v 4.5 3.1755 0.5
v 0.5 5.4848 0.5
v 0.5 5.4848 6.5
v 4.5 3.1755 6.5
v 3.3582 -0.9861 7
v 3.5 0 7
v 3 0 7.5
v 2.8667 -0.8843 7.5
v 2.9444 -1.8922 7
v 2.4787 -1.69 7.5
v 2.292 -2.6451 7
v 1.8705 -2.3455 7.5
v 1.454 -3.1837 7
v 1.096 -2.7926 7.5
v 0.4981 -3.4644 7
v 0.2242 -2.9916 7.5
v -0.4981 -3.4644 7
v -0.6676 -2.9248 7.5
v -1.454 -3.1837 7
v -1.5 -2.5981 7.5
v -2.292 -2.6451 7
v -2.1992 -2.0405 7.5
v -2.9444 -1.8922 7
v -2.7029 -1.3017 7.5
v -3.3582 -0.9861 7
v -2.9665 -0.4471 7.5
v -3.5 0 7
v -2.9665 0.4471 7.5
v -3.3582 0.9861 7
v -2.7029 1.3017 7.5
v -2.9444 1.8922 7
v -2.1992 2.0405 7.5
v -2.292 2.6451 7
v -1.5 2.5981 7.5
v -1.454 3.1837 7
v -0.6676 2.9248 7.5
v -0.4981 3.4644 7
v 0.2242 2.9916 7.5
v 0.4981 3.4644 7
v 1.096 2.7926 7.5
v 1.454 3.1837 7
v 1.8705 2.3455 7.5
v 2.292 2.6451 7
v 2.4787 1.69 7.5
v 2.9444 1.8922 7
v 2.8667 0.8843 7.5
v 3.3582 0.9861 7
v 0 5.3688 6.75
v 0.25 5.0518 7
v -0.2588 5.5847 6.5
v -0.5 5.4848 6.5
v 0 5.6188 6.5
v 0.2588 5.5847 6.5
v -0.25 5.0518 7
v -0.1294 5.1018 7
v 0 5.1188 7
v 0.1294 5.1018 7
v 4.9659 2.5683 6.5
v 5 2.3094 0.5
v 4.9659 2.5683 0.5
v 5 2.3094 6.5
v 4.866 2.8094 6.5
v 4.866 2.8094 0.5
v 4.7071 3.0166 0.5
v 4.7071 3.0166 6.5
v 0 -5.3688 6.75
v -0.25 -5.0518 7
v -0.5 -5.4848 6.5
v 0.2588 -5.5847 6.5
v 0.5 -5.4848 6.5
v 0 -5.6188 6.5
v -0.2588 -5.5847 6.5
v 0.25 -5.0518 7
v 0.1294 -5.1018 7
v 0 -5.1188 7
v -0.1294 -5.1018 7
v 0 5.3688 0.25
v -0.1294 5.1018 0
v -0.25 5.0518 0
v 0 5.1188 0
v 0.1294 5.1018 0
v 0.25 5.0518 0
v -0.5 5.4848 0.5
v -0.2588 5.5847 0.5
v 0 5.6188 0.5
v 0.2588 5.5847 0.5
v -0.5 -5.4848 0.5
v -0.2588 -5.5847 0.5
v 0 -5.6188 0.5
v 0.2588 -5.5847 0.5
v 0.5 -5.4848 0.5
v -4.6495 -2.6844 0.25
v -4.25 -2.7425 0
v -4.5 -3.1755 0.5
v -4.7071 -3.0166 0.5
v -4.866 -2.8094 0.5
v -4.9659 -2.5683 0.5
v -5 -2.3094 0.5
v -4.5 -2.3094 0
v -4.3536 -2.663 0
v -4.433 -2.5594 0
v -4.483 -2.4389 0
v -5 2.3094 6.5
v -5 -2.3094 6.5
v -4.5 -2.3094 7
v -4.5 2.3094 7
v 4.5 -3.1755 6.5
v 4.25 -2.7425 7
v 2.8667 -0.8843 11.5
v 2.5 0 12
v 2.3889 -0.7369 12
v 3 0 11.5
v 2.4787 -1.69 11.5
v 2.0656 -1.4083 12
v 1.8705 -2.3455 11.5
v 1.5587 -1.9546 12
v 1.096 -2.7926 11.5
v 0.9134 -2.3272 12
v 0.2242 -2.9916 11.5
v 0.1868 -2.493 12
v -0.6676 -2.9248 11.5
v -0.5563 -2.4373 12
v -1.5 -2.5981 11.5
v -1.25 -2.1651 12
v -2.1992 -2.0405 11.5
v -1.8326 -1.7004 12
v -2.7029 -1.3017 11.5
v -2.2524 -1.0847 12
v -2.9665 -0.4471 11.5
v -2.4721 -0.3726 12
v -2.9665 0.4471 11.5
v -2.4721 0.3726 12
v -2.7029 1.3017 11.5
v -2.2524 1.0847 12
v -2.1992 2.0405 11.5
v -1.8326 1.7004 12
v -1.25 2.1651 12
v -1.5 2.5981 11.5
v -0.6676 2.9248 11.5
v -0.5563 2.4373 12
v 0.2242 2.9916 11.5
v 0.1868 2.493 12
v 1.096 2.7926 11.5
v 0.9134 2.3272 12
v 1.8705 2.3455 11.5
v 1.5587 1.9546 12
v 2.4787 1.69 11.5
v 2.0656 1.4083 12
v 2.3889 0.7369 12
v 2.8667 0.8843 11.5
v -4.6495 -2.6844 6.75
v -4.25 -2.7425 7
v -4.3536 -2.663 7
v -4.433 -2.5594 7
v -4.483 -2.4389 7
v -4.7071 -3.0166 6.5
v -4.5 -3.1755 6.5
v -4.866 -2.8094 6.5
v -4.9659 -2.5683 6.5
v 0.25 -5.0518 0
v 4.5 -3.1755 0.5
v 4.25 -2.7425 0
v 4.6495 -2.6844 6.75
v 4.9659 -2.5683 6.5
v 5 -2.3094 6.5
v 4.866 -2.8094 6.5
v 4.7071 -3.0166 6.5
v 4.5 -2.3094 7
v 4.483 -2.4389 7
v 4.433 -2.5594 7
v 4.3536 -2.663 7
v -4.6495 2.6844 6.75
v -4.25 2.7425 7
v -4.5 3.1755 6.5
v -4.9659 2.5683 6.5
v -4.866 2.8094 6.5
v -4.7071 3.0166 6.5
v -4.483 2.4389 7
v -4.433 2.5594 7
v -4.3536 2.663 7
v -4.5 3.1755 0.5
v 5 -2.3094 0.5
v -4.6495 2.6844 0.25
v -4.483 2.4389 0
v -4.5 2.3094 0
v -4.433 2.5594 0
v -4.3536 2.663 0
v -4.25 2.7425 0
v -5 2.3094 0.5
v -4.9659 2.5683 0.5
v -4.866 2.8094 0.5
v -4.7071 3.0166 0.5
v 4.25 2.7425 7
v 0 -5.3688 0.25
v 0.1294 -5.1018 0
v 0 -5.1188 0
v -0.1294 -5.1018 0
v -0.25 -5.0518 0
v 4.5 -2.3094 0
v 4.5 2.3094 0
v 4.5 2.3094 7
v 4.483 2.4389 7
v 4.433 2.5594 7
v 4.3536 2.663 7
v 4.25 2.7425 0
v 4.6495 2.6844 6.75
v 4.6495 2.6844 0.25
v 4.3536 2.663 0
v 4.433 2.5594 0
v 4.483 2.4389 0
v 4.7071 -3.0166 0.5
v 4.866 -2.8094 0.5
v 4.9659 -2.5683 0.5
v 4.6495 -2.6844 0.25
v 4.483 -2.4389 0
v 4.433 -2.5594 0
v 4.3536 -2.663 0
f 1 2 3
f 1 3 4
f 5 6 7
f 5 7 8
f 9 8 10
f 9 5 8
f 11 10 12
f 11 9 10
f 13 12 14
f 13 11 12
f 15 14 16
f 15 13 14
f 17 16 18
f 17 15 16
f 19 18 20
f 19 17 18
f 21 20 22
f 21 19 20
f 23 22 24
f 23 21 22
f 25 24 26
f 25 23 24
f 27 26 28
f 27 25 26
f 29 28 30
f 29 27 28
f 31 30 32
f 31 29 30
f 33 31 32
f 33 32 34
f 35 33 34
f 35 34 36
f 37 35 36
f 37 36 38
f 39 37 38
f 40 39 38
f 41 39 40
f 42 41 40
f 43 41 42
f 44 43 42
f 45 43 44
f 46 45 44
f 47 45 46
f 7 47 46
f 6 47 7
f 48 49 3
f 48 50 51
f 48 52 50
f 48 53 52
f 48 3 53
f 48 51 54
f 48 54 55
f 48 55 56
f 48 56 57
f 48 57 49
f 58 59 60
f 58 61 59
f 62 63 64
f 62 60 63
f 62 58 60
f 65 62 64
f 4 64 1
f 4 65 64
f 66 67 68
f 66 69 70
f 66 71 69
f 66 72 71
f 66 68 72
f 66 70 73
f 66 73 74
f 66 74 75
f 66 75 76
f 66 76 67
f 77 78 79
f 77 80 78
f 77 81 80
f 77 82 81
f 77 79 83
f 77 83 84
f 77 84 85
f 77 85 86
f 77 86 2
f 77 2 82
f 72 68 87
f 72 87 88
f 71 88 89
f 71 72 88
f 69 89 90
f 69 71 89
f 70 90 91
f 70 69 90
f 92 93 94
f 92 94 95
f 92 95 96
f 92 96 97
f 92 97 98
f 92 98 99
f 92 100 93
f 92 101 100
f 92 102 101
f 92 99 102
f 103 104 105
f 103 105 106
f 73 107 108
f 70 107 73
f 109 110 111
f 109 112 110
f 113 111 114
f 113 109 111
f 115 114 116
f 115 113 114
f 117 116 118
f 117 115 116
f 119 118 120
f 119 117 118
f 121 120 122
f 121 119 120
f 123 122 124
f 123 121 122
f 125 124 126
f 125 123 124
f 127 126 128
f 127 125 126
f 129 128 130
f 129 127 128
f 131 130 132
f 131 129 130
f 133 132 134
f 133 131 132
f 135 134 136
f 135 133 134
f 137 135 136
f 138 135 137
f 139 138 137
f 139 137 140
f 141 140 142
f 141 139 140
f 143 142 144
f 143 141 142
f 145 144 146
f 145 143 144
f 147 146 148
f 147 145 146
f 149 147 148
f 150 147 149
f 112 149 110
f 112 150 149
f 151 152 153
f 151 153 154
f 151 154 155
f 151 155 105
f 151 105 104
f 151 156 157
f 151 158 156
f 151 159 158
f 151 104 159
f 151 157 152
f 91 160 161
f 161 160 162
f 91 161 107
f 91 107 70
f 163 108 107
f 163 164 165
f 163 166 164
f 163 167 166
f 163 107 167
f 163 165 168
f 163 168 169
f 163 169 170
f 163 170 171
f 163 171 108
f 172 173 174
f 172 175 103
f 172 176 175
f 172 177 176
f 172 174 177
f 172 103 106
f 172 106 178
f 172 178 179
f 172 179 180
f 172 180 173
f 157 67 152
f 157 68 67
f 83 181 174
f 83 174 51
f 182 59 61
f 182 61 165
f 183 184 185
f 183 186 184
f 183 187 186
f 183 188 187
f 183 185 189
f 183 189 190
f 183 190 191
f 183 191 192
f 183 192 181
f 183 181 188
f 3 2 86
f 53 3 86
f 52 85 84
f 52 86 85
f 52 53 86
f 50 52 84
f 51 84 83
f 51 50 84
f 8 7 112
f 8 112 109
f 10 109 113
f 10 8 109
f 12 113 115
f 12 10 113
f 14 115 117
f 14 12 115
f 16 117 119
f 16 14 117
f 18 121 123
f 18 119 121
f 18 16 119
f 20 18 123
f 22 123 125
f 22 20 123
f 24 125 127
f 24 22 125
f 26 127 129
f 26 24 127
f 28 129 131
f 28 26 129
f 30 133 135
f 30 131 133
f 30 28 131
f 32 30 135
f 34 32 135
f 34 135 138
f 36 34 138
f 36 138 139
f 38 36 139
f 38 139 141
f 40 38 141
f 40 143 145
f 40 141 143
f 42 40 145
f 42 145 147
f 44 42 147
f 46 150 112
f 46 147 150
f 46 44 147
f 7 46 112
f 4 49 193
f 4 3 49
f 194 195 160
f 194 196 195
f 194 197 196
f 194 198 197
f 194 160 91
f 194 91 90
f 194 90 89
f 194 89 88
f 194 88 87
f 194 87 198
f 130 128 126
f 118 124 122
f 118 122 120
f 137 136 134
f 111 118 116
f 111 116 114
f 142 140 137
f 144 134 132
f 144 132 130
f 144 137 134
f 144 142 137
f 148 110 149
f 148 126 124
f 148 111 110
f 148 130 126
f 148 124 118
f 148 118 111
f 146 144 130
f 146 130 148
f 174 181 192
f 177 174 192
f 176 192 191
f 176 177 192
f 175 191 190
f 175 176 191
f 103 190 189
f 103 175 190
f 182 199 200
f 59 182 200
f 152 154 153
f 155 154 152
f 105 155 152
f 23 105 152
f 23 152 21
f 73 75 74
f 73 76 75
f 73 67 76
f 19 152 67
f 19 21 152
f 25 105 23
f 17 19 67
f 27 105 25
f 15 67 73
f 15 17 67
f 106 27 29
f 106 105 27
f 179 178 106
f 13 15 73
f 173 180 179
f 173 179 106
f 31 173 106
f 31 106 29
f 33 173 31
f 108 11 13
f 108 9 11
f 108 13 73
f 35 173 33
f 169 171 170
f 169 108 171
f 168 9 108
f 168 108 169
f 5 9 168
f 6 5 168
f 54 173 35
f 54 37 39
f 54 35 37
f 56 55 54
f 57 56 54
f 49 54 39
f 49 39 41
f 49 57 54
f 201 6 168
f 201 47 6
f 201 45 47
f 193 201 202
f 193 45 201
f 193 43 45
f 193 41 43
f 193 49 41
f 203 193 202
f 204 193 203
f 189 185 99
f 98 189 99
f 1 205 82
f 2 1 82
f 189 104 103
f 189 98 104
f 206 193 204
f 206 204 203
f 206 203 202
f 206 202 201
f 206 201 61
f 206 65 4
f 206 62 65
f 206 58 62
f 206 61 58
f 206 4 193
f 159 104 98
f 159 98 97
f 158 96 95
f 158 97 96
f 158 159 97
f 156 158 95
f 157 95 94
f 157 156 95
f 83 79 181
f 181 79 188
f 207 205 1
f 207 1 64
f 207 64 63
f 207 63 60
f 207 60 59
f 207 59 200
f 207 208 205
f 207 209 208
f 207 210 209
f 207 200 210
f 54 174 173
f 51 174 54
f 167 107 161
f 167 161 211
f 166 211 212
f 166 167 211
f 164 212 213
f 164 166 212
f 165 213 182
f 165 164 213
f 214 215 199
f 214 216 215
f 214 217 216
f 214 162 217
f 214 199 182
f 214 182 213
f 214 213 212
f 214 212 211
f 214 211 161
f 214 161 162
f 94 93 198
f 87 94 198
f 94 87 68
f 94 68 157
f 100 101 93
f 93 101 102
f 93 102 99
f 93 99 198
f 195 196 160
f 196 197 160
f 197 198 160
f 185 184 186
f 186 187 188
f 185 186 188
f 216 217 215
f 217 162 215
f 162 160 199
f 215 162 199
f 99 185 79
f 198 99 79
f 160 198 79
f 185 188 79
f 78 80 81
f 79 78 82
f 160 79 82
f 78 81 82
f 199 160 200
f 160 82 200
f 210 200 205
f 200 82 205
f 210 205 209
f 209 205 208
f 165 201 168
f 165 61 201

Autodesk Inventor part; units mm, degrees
ref_plane "YZ Plane" through (0, 0, 0) normal (1, 0, 0) x (0, 1, 0)
ref_plane "XZ Plane" through (0, 0, 0) normal (0, 1, 0) x (-1, 0, 0)
ref_plane "XY Plane" through (0, 0, 0) normal (0, 0, 1) x (1, 0, 0)
sketch "Sketch1" plane through (0, 0, 0) normal (0, 0, 1) x (1, 0, 0)
  line L0 (5, 2.8868) -> (5, -2.8868)
  line L1 (5, -2.8868) -> (0, -5.7735)
  line L2 (0, -5.7735) -> (-5, -2.8868)
  line L3 (-5, -2.8868) -> (-5, 2.8868)
  line L4 (-5, 2.8868) -> (0, 5.7735)
  line L5 (0, 5.7735) -> (5, 2.8868)
  point P0 (0, 0)
  point P1 (0, 0)
  dimension "d0" = 10
extrude "Extrusion1" add sketch "Sketch1" along normal blind 7
sketch "Sketch2" plane through (0, 0, 7) normal (0, 0, 1) x (1, 0, 0)
  circle A0 centre (0, 0) radius 3
  dimension "d3" = 6
extrude "Extrusion2" add sketch "Sketch2" along normal blind 5
fillet "Fillet1" radius 1 6 edges at (-5, 2.8868, 3.5) (-5, -2.8868, 3.5) (0, -5.7735, 3.5) (5, -2.8868, 3.5) (5, 2.8868, 3.5) (0, 5.7735, 3.5)
chamfer "Chamfer1" distance 0.5 angle 45 1 edges at (-3, 0, 7)
chamfer "Chamfer2" distance 0.5 angle 45 25 edges at (-3, 0, 12) (2.5, -4.3301, 7) (4.866, -2.8094, 7) (5, 0, 7) (4.866, 2.8094, 7) (2.5, 4.3301, 7) (0, 5.6188, 7) (-2.5, 4.3301, 7) (-4.866, 2.8094, 7) (-5, 0, 7) (-4.866, -2.8094, 7) (-2.5, -4.3301, 7) (0, -5.6188, 7) (2.5, -4.3301, 0) (4.866, -2.8094, 0) (5, 0, 0) (4.866, 2.8094, 0) (2.5, 4.3301, 0) (0, 5.6188, 0) (-2.5, 4.3301, 0) (-4.866, 2.8094, 0) (-5, 0, 0) (-4.866, -2.8094, 0) (-2.5, -4.3301, 0) (0, -5.6188, 0)
properties part number "TPU-legs" material "Rubber"
